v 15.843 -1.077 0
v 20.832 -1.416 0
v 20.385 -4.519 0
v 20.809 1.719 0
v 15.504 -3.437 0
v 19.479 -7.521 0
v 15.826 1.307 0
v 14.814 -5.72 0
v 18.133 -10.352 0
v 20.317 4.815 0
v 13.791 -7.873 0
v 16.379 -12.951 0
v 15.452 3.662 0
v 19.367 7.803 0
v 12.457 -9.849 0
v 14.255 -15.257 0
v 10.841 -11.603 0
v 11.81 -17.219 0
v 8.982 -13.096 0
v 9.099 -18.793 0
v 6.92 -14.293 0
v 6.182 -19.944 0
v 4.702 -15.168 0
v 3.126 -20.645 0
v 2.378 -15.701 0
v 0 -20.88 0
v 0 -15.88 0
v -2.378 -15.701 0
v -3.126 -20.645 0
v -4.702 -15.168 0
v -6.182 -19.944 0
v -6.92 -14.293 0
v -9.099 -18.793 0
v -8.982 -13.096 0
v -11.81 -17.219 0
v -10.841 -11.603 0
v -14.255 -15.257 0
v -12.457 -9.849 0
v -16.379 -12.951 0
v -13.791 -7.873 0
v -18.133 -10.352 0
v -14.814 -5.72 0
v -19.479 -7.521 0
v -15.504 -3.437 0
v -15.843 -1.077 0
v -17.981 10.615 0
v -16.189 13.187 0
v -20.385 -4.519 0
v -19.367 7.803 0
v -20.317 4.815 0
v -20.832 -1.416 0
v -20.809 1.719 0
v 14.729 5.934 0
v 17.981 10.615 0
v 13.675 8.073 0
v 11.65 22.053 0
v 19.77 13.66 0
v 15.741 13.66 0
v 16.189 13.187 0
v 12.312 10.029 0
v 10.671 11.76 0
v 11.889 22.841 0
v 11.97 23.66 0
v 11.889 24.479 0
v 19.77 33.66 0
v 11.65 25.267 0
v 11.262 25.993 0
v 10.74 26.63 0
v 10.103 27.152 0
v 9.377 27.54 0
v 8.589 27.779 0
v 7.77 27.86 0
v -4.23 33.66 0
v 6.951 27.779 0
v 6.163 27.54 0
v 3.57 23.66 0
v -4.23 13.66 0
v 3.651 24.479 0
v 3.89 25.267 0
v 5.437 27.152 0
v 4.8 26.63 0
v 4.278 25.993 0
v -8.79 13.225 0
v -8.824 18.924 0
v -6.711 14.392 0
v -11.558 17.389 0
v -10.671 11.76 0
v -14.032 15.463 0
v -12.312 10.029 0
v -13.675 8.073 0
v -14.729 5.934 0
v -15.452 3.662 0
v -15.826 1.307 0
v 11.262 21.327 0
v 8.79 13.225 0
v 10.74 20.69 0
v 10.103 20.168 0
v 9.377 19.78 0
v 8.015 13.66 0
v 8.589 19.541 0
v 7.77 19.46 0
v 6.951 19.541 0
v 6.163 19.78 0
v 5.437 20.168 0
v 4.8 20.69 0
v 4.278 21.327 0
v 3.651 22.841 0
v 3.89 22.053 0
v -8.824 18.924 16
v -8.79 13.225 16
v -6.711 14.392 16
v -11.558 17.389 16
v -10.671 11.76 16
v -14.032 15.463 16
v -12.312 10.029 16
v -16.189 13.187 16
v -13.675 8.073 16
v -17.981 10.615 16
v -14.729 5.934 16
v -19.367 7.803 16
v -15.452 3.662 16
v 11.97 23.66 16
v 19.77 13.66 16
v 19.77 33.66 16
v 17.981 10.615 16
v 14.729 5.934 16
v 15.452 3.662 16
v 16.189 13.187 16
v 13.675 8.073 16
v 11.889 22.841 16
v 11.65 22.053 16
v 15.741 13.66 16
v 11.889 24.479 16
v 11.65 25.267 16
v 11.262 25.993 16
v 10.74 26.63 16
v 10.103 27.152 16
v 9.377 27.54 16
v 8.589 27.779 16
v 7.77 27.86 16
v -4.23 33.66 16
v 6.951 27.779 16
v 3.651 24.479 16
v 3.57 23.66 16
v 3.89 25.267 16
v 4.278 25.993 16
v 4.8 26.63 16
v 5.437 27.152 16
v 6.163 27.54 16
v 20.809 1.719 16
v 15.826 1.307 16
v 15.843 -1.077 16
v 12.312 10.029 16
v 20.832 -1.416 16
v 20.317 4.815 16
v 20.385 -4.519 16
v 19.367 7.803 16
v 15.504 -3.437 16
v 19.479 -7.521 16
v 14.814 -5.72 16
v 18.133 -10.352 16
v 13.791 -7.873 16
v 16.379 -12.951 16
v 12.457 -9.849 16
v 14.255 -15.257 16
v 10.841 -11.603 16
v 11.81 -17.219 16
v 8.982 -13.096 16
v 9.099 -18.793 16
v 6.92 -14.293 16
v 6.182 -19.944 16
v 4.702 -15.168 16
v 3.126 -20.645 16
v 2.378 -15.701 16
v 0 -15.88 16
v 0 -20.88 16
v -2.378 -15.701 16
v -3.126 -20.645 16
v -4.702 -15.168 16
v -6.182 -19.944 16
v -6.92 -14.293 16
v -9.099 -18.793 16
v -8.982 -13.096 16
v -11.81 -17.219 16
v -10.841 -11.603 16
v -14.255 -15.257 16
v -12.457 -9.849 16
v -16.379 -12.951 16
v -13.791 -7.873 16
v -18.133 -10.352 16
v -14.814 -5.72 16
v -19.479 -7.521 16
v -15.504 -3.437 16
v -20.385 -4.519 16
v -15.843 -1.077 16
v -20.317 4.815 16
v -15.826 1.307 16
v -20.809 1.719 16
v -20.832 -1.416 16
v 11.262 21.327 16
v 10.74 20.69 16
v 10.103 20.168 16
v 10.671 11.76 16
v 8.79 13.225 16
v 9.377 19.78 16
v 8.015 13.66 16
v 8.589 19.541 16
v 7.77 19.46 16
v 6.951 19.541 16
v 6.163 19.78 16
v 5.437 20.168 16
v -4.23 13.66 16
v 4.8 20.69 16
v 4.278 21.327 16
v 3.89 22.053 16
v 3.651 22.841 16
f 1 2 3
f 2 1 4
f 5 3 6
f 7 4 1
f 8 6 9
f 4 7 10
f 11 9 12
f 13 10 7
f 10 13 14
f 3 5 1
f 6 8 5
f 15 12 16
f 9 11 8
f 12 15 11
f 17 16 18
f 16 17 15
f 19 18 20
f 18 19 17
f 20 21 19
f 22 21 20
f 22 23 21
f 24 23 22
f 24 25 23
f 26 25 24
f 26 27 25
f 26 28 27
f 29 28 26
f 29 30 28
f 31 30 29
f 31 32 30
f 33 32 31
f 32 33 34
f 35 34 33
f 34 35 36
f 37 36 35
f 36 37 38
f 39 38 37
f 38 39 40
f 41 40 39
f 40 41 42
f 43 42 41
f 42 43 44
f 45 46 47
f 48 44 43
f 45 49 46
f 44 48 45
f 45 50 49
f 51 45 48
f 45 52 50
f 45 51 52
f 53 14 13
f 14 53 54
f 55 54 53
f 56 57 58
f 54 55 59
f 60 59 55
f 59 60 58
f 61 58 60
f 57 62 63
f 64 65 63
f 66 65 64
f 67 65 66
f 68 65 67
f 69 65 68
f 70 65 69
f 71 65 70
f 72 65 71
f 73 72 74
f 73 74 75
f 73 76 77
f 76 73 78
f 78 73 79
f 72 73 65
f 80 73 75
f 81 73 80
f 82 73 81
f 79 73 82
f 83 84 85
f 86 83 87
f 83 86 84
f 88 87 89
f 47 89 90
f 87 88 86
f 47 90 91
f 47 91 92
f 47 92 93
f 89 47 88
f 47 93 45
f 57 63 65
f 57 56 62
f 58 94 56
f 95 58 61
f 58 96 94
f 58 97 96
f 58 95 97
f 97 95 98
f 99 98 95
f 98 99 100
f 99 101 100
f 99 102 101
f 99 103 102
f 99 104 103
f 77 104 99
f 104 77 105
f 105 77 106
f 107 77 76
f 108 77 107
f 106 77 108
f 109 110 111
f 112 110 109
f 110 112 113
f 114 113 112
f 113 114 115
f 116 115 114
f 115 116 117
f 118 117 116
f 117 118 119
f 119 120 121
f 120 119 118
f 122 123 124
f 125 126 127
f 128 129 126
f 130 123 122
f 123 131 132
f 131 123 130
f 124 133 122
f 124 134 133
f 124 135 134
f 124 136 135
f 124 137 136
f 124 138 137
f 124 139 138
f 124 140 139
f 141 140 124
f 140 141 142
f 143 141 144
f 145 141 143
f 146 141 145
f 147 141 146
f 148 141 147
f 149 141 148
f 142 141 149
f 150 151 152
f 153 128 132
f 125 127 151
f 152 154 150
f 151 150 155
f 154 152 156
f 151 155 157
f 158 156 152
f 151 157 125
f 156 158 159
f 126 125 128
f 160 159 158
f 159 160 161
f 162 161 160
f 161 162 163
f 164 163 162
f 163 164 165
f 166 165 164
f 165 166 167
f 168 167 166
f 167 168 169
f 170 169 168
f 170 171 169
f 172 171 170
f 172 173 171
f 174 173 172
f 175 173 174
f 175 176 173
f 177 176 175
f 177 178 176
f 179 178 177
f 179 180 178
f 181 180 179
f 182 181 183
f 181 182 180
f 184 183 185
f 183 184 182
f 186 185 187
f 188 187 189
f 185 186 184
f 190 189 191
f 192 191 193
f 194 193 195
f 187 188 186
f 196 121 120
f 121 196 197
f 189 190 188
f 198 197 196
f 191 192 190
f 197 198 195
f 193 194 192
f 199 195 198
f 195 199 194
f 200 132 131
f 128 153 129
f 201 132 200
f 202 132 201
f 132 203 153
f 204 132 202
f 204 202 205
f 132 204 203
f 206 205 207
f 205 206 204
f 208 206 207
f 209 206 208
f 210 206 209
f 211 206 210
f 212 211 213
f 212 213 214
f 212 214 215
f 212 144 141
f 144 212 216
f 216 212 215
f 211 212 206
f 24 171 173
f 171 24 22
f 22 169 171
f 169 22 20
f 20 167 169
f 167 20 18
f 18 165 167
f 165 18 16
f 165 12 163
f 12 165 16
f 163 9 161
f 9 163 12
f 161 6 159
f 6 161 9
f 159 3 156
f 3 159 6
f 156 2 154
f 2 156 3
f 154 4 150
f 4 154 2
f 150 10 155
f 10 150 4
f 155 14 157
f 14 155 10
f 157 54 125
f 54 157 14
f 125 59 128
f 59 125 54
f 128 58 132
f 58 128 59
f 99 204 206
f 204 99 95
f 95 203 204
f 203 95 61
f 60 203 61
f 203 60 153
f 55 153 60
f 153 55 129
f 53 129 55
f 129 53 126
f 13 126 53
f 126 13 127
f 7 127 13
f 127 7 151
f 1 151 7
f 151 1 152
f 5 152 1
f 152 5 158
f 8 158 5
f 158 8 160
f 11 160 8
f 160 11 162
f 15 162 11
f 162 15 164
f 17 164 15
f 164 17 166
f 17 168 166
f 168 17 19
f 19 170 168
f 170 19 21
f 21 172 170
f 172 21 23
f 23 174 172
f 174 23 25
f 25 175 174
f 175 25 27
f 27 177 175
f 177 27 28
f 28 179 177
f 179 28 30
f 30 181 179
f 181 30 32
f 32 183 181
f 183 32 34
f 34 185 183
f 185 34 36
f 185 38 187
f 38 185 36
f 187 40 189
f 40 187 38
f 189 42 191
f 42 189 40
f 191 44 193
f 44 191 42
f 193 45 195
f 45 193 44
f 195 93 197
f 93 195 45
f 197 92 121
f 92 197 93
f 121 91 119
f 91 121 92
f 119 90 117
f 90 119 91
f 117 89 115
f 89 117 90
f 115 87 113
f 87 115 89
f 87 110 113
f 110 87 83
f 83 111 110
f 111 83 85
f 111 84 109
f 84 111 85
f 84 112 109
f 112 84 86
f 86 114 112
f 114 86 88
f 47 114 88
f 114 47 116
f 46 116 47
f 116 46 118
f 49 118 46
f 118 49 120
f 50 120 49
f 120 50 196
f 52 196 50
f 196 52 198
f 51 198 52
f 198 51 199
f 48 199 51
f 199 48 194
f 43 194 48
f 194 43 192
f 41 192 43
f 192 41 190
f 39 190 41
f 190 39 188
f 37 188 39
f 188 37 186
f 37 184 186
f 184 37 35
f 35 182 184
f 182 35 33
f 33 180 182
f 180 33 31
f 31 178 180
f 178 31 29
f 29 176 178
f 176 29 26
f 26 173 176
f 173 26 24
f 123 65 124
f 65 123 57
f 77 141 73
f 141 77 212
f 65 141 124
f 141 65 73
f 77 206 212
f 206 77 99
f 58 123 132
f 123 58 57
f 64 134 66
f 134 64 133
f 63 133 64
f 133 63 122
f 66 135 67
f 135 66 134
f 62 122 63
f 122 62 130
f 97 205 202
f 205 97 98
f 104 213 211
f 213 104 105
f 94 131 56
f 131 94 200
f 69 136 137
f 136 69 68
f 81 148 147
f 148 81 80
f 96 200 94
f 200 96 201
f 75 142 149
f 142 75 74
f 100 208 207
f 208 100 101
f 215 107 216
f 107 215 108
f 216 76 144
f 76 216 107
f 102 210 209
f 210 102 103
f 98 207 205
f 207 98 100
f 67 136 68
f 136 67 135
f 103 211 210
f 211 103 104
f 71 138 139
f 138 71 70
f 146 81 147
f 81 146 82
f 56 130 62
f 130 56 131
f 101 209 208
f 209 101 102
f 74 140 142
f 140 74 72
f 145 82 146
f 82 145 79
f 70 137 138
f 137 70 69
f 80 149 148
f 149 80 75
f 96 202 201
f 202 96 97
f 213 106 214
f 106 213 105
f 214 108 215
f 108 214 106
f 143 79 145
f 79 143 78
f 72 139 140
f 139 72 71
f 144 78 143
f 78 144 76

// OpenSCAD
$fn = 32;

// ----------------------------------------------------------------------
// Pipe clamp: 41.76 mm ring, 5 mm wall, 16 mm wide
// ----------------------------------------------------------------------

// --- parameters (mm) ---
outer_r = 20.88;          // clamp outside radius
inner_r = 15.88;          // pipe bore radius
band = 5;                 // band thickness
clamp_w = 16;             // clamp width
opening = 50;             // opening angle between the ends
lug_w = 24;               // lug width
lug_len = 20;             // lug length
bolt_d = 8.4;             // bolt hole

clamp_profile = [[-8.824, 18.924], [-11.558, 17.389], [-14.032, 15.463], [-16.189, 13.187], [-17.981, 10.615], [-19.367, 7.803], [-20.317, 4.815], [-20.809, 1.719], [-20.832, -1.416], [-20.385, -4.519], [-19.479, -7.521], [-18.133, -10.352], [-16.379, -12.951], [-14.255, -15.257], [-11.81, -17.219], [-9.099, -18.793], [-6.182, -19.944], [-3.126, -20.645], [0, -20.88], [3.126, -20.645], [6.182, -19.944], [9.099, -18.793], [11.81, -17.219], [14.255, -15.257], [16.379, -12.951], [18.133, -10.352], [19.479, -7.521], [20.385, -4.519], [20.832, -1.416], [20.809, 1.719], [20.317, 4.815], [19.367, 7.803], [17.981, 10.615], [16.189, 13.187], [14.032, 15.463], [11.558, 17.389], [8.824, 18.924], [6.711, 14.392], [8.79, 13.225], [10.671, 11.76], [12.312, 10.029], [13.675, 8.073], [14.729, 5.934], [15.452, 3.662], [15.826, 1.307], [15.843, -1.077], [15.504, -3.437], [14.814, -5.72], [13.791, -7.873], [12.457, -9.849], [10.841, -11.603], [8.982, -13.096], [6.92, -14.293], [4.702, -15.168], [2.378, -15.701], [0, -15.88], [-2.378, -15.701], [-4.702, -15.168], [-6.92, -14.293], [-8.982, -13.096], [-10.841, -11.603], [-12.457, -9.849], [-13.791, -7.873], [-14.814, -5.72], [-15.504, -3.437], [-15.843, -1.077], [-15.826, 1.307], [-15.452, 3.662], [-14.729, 5.934], [-13.675, 8.073], [-12.312, 10.029], [-10.671, 11.76], [-8.79, 13.225], [-6.711, 14.392]];

difference() {
  union() {
    linear_extrude(height = clamp_w) polygon(clamp_profile);
    /* bolt lug on the other end */
    translate([-4.23, 13.66, 0]) cube([lug_w, 20, clamp_w]);
  }
  translate([7.77, 23.66, -2.5]) cylinder(h = clamp_w + 5, d = bolt_d);
}
